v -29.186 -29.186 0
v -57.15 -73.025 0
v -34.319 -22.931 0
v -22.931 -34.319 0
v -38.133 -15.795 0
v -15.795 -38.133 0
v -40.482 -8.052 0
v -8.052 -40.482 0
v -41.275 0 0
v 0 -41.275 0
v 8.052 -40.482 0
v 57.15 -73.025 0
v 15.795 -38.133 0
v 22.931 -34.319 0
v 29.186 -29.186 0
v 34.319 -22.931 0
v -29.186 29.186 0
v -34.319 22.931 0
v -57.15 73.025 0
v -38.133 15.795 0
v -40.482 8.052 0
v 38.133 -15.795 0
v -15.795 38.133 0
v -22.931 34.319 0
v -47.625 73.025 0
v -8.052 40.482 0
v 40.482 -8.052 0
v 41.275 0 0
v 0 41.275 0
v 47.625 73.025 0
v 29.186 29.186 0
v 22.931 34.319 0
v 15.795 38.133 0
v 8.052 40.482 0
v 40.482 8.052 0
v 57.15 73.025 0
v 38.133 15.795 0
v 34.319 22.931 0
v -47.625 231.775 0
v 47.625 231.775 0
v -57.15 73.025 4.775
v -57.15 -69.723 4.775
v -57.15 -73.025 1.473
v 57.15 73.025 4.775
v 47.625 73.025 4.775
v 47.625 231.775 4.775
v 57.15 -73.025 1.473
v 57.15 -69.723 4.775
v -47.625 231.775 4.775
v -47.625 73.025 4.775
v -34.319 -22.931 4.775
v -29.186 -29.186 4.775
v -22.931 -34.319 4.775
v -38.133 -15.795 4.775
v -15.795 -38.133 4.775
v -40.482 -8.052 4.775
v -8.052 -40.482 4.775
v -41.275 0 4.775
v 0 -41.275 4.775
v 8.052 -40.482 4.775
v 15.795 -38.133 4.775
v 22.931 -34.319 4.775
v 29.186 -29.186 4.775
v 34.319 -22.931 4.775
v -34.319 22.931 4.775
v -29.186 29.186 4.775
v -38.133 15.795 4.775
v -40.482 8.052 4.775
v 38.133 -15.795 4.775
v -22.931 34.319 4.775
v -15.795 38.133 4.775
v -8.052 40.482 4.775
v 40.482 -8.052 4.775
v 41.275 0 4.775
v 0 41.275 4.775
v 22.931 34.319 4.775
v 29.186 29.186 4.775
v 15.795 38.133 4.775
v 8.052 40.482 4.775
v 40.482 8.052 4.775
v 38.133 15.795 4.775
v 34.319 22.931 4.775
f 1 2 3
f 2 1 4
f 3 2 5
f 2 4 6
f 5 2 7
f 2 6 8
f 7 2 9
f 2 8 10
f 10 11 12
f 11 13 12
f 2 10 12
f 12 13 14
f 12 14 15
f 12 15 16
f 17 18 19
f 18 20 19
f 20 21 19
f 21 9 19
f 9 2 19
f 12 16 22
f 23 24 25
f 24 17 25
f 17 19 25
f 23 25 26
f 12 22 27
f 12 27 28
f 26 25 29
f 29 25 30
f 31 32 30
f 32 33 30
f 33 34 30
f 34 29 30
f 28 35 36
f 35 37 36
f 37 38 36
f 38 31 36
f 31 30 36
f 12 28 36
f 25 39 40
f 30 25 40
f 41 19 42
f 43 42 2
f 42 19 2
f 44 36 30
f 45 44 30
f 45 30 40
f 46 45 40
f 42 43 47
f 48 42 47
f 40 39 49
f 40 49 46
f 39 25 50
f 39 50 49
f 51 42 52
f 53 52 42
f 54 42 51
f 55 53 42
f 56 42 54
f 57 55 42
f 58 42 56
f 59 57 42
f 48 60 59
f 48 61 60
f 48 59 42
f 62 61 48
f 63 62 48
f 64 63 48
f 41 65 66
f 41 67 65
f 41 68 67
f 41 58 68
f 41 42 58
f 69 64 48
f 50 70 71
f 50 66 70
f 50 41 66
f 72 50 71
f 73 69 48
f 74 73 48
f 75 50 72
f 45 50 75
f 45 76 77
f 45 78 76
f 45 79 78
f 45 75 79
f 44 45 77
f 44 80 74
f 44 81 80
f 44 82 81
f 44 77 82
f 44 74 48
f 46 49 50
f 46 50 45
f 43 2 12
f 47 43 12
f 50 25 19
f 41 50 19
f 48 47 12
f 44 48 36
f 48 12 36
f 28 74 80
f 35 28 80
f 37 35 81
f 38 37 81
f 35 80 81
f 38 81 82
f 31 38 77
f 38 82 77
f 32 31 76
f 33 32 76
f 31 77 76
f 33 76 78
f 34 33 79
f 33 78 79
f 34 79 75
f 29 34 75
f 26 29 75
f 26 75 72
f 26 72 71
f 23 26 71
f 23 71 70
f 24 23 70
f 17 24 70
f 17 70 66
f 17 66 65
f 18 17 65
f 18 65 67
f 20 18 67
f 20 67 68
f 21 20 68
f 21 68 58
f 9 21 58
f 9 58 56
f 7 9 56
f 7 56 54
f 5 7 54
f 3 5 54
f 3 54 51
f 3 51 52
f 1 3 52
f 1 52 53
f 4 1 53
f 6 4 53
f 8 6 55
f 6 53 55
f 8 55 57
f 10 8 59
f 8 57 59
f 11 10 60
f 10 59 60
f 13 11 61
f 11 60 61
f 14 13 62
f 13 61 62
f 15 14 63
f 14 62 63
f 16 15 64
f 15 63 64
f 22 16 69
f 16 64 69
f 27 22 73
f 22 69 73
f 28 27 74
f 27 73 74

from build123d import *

# Parameters (mm, degrees)
F0_W     = 95.25
F0_H     = 158.75
F0_W_2   = 6.35
F0_H_2   = 133.35
F1_DEPTH = 4.7752
F2_R     = 41.275
F3_DEPTH = 25.4
F4_SIZE  = 3.302


with BuildPart() as f1:
    # F0 (on Top) → F1 (new body)
    with BuildSketch(Plane.XY):
        Polygon((-50.8, -73.025), (50.8, -73.025), (50.8, 60.325), (57.15, 60.325), (57.15, 73.025), (47.625, 73.025), (-47.625, 73.025), (-57.15, 73.025), (-57.15, 60.325), (-50.8, 60.325), align=None)
        with Locations((0, 152.4)):
            Rectangle(F0_W, F0_H)
        with Locations((-53.975, -6.35)):
            Rectangle(F0_W_2, F0_H_2)
        with Locations((53.975, -6.35)):
            Rectangle(F0_W_2, F0_H_2)
    extrude(amount=F1_DEPTH)

    # F2 (on face) → F3 (cut)
    with BuildSketch(Plane.XY.offset(4.7752)):
        Circle(F2_R)
    extrude(amount=-F3_DEPTH, mode=Mode.SUBTRACT)

    # F4
    f4_edges = [f1.edges().sort_by_distance(p)[0] for p in [
        (0, -73.025, 4.7752),
    ]]
    chamfer(f4_edges, length=F4_SIZE)


solid = f1.part
